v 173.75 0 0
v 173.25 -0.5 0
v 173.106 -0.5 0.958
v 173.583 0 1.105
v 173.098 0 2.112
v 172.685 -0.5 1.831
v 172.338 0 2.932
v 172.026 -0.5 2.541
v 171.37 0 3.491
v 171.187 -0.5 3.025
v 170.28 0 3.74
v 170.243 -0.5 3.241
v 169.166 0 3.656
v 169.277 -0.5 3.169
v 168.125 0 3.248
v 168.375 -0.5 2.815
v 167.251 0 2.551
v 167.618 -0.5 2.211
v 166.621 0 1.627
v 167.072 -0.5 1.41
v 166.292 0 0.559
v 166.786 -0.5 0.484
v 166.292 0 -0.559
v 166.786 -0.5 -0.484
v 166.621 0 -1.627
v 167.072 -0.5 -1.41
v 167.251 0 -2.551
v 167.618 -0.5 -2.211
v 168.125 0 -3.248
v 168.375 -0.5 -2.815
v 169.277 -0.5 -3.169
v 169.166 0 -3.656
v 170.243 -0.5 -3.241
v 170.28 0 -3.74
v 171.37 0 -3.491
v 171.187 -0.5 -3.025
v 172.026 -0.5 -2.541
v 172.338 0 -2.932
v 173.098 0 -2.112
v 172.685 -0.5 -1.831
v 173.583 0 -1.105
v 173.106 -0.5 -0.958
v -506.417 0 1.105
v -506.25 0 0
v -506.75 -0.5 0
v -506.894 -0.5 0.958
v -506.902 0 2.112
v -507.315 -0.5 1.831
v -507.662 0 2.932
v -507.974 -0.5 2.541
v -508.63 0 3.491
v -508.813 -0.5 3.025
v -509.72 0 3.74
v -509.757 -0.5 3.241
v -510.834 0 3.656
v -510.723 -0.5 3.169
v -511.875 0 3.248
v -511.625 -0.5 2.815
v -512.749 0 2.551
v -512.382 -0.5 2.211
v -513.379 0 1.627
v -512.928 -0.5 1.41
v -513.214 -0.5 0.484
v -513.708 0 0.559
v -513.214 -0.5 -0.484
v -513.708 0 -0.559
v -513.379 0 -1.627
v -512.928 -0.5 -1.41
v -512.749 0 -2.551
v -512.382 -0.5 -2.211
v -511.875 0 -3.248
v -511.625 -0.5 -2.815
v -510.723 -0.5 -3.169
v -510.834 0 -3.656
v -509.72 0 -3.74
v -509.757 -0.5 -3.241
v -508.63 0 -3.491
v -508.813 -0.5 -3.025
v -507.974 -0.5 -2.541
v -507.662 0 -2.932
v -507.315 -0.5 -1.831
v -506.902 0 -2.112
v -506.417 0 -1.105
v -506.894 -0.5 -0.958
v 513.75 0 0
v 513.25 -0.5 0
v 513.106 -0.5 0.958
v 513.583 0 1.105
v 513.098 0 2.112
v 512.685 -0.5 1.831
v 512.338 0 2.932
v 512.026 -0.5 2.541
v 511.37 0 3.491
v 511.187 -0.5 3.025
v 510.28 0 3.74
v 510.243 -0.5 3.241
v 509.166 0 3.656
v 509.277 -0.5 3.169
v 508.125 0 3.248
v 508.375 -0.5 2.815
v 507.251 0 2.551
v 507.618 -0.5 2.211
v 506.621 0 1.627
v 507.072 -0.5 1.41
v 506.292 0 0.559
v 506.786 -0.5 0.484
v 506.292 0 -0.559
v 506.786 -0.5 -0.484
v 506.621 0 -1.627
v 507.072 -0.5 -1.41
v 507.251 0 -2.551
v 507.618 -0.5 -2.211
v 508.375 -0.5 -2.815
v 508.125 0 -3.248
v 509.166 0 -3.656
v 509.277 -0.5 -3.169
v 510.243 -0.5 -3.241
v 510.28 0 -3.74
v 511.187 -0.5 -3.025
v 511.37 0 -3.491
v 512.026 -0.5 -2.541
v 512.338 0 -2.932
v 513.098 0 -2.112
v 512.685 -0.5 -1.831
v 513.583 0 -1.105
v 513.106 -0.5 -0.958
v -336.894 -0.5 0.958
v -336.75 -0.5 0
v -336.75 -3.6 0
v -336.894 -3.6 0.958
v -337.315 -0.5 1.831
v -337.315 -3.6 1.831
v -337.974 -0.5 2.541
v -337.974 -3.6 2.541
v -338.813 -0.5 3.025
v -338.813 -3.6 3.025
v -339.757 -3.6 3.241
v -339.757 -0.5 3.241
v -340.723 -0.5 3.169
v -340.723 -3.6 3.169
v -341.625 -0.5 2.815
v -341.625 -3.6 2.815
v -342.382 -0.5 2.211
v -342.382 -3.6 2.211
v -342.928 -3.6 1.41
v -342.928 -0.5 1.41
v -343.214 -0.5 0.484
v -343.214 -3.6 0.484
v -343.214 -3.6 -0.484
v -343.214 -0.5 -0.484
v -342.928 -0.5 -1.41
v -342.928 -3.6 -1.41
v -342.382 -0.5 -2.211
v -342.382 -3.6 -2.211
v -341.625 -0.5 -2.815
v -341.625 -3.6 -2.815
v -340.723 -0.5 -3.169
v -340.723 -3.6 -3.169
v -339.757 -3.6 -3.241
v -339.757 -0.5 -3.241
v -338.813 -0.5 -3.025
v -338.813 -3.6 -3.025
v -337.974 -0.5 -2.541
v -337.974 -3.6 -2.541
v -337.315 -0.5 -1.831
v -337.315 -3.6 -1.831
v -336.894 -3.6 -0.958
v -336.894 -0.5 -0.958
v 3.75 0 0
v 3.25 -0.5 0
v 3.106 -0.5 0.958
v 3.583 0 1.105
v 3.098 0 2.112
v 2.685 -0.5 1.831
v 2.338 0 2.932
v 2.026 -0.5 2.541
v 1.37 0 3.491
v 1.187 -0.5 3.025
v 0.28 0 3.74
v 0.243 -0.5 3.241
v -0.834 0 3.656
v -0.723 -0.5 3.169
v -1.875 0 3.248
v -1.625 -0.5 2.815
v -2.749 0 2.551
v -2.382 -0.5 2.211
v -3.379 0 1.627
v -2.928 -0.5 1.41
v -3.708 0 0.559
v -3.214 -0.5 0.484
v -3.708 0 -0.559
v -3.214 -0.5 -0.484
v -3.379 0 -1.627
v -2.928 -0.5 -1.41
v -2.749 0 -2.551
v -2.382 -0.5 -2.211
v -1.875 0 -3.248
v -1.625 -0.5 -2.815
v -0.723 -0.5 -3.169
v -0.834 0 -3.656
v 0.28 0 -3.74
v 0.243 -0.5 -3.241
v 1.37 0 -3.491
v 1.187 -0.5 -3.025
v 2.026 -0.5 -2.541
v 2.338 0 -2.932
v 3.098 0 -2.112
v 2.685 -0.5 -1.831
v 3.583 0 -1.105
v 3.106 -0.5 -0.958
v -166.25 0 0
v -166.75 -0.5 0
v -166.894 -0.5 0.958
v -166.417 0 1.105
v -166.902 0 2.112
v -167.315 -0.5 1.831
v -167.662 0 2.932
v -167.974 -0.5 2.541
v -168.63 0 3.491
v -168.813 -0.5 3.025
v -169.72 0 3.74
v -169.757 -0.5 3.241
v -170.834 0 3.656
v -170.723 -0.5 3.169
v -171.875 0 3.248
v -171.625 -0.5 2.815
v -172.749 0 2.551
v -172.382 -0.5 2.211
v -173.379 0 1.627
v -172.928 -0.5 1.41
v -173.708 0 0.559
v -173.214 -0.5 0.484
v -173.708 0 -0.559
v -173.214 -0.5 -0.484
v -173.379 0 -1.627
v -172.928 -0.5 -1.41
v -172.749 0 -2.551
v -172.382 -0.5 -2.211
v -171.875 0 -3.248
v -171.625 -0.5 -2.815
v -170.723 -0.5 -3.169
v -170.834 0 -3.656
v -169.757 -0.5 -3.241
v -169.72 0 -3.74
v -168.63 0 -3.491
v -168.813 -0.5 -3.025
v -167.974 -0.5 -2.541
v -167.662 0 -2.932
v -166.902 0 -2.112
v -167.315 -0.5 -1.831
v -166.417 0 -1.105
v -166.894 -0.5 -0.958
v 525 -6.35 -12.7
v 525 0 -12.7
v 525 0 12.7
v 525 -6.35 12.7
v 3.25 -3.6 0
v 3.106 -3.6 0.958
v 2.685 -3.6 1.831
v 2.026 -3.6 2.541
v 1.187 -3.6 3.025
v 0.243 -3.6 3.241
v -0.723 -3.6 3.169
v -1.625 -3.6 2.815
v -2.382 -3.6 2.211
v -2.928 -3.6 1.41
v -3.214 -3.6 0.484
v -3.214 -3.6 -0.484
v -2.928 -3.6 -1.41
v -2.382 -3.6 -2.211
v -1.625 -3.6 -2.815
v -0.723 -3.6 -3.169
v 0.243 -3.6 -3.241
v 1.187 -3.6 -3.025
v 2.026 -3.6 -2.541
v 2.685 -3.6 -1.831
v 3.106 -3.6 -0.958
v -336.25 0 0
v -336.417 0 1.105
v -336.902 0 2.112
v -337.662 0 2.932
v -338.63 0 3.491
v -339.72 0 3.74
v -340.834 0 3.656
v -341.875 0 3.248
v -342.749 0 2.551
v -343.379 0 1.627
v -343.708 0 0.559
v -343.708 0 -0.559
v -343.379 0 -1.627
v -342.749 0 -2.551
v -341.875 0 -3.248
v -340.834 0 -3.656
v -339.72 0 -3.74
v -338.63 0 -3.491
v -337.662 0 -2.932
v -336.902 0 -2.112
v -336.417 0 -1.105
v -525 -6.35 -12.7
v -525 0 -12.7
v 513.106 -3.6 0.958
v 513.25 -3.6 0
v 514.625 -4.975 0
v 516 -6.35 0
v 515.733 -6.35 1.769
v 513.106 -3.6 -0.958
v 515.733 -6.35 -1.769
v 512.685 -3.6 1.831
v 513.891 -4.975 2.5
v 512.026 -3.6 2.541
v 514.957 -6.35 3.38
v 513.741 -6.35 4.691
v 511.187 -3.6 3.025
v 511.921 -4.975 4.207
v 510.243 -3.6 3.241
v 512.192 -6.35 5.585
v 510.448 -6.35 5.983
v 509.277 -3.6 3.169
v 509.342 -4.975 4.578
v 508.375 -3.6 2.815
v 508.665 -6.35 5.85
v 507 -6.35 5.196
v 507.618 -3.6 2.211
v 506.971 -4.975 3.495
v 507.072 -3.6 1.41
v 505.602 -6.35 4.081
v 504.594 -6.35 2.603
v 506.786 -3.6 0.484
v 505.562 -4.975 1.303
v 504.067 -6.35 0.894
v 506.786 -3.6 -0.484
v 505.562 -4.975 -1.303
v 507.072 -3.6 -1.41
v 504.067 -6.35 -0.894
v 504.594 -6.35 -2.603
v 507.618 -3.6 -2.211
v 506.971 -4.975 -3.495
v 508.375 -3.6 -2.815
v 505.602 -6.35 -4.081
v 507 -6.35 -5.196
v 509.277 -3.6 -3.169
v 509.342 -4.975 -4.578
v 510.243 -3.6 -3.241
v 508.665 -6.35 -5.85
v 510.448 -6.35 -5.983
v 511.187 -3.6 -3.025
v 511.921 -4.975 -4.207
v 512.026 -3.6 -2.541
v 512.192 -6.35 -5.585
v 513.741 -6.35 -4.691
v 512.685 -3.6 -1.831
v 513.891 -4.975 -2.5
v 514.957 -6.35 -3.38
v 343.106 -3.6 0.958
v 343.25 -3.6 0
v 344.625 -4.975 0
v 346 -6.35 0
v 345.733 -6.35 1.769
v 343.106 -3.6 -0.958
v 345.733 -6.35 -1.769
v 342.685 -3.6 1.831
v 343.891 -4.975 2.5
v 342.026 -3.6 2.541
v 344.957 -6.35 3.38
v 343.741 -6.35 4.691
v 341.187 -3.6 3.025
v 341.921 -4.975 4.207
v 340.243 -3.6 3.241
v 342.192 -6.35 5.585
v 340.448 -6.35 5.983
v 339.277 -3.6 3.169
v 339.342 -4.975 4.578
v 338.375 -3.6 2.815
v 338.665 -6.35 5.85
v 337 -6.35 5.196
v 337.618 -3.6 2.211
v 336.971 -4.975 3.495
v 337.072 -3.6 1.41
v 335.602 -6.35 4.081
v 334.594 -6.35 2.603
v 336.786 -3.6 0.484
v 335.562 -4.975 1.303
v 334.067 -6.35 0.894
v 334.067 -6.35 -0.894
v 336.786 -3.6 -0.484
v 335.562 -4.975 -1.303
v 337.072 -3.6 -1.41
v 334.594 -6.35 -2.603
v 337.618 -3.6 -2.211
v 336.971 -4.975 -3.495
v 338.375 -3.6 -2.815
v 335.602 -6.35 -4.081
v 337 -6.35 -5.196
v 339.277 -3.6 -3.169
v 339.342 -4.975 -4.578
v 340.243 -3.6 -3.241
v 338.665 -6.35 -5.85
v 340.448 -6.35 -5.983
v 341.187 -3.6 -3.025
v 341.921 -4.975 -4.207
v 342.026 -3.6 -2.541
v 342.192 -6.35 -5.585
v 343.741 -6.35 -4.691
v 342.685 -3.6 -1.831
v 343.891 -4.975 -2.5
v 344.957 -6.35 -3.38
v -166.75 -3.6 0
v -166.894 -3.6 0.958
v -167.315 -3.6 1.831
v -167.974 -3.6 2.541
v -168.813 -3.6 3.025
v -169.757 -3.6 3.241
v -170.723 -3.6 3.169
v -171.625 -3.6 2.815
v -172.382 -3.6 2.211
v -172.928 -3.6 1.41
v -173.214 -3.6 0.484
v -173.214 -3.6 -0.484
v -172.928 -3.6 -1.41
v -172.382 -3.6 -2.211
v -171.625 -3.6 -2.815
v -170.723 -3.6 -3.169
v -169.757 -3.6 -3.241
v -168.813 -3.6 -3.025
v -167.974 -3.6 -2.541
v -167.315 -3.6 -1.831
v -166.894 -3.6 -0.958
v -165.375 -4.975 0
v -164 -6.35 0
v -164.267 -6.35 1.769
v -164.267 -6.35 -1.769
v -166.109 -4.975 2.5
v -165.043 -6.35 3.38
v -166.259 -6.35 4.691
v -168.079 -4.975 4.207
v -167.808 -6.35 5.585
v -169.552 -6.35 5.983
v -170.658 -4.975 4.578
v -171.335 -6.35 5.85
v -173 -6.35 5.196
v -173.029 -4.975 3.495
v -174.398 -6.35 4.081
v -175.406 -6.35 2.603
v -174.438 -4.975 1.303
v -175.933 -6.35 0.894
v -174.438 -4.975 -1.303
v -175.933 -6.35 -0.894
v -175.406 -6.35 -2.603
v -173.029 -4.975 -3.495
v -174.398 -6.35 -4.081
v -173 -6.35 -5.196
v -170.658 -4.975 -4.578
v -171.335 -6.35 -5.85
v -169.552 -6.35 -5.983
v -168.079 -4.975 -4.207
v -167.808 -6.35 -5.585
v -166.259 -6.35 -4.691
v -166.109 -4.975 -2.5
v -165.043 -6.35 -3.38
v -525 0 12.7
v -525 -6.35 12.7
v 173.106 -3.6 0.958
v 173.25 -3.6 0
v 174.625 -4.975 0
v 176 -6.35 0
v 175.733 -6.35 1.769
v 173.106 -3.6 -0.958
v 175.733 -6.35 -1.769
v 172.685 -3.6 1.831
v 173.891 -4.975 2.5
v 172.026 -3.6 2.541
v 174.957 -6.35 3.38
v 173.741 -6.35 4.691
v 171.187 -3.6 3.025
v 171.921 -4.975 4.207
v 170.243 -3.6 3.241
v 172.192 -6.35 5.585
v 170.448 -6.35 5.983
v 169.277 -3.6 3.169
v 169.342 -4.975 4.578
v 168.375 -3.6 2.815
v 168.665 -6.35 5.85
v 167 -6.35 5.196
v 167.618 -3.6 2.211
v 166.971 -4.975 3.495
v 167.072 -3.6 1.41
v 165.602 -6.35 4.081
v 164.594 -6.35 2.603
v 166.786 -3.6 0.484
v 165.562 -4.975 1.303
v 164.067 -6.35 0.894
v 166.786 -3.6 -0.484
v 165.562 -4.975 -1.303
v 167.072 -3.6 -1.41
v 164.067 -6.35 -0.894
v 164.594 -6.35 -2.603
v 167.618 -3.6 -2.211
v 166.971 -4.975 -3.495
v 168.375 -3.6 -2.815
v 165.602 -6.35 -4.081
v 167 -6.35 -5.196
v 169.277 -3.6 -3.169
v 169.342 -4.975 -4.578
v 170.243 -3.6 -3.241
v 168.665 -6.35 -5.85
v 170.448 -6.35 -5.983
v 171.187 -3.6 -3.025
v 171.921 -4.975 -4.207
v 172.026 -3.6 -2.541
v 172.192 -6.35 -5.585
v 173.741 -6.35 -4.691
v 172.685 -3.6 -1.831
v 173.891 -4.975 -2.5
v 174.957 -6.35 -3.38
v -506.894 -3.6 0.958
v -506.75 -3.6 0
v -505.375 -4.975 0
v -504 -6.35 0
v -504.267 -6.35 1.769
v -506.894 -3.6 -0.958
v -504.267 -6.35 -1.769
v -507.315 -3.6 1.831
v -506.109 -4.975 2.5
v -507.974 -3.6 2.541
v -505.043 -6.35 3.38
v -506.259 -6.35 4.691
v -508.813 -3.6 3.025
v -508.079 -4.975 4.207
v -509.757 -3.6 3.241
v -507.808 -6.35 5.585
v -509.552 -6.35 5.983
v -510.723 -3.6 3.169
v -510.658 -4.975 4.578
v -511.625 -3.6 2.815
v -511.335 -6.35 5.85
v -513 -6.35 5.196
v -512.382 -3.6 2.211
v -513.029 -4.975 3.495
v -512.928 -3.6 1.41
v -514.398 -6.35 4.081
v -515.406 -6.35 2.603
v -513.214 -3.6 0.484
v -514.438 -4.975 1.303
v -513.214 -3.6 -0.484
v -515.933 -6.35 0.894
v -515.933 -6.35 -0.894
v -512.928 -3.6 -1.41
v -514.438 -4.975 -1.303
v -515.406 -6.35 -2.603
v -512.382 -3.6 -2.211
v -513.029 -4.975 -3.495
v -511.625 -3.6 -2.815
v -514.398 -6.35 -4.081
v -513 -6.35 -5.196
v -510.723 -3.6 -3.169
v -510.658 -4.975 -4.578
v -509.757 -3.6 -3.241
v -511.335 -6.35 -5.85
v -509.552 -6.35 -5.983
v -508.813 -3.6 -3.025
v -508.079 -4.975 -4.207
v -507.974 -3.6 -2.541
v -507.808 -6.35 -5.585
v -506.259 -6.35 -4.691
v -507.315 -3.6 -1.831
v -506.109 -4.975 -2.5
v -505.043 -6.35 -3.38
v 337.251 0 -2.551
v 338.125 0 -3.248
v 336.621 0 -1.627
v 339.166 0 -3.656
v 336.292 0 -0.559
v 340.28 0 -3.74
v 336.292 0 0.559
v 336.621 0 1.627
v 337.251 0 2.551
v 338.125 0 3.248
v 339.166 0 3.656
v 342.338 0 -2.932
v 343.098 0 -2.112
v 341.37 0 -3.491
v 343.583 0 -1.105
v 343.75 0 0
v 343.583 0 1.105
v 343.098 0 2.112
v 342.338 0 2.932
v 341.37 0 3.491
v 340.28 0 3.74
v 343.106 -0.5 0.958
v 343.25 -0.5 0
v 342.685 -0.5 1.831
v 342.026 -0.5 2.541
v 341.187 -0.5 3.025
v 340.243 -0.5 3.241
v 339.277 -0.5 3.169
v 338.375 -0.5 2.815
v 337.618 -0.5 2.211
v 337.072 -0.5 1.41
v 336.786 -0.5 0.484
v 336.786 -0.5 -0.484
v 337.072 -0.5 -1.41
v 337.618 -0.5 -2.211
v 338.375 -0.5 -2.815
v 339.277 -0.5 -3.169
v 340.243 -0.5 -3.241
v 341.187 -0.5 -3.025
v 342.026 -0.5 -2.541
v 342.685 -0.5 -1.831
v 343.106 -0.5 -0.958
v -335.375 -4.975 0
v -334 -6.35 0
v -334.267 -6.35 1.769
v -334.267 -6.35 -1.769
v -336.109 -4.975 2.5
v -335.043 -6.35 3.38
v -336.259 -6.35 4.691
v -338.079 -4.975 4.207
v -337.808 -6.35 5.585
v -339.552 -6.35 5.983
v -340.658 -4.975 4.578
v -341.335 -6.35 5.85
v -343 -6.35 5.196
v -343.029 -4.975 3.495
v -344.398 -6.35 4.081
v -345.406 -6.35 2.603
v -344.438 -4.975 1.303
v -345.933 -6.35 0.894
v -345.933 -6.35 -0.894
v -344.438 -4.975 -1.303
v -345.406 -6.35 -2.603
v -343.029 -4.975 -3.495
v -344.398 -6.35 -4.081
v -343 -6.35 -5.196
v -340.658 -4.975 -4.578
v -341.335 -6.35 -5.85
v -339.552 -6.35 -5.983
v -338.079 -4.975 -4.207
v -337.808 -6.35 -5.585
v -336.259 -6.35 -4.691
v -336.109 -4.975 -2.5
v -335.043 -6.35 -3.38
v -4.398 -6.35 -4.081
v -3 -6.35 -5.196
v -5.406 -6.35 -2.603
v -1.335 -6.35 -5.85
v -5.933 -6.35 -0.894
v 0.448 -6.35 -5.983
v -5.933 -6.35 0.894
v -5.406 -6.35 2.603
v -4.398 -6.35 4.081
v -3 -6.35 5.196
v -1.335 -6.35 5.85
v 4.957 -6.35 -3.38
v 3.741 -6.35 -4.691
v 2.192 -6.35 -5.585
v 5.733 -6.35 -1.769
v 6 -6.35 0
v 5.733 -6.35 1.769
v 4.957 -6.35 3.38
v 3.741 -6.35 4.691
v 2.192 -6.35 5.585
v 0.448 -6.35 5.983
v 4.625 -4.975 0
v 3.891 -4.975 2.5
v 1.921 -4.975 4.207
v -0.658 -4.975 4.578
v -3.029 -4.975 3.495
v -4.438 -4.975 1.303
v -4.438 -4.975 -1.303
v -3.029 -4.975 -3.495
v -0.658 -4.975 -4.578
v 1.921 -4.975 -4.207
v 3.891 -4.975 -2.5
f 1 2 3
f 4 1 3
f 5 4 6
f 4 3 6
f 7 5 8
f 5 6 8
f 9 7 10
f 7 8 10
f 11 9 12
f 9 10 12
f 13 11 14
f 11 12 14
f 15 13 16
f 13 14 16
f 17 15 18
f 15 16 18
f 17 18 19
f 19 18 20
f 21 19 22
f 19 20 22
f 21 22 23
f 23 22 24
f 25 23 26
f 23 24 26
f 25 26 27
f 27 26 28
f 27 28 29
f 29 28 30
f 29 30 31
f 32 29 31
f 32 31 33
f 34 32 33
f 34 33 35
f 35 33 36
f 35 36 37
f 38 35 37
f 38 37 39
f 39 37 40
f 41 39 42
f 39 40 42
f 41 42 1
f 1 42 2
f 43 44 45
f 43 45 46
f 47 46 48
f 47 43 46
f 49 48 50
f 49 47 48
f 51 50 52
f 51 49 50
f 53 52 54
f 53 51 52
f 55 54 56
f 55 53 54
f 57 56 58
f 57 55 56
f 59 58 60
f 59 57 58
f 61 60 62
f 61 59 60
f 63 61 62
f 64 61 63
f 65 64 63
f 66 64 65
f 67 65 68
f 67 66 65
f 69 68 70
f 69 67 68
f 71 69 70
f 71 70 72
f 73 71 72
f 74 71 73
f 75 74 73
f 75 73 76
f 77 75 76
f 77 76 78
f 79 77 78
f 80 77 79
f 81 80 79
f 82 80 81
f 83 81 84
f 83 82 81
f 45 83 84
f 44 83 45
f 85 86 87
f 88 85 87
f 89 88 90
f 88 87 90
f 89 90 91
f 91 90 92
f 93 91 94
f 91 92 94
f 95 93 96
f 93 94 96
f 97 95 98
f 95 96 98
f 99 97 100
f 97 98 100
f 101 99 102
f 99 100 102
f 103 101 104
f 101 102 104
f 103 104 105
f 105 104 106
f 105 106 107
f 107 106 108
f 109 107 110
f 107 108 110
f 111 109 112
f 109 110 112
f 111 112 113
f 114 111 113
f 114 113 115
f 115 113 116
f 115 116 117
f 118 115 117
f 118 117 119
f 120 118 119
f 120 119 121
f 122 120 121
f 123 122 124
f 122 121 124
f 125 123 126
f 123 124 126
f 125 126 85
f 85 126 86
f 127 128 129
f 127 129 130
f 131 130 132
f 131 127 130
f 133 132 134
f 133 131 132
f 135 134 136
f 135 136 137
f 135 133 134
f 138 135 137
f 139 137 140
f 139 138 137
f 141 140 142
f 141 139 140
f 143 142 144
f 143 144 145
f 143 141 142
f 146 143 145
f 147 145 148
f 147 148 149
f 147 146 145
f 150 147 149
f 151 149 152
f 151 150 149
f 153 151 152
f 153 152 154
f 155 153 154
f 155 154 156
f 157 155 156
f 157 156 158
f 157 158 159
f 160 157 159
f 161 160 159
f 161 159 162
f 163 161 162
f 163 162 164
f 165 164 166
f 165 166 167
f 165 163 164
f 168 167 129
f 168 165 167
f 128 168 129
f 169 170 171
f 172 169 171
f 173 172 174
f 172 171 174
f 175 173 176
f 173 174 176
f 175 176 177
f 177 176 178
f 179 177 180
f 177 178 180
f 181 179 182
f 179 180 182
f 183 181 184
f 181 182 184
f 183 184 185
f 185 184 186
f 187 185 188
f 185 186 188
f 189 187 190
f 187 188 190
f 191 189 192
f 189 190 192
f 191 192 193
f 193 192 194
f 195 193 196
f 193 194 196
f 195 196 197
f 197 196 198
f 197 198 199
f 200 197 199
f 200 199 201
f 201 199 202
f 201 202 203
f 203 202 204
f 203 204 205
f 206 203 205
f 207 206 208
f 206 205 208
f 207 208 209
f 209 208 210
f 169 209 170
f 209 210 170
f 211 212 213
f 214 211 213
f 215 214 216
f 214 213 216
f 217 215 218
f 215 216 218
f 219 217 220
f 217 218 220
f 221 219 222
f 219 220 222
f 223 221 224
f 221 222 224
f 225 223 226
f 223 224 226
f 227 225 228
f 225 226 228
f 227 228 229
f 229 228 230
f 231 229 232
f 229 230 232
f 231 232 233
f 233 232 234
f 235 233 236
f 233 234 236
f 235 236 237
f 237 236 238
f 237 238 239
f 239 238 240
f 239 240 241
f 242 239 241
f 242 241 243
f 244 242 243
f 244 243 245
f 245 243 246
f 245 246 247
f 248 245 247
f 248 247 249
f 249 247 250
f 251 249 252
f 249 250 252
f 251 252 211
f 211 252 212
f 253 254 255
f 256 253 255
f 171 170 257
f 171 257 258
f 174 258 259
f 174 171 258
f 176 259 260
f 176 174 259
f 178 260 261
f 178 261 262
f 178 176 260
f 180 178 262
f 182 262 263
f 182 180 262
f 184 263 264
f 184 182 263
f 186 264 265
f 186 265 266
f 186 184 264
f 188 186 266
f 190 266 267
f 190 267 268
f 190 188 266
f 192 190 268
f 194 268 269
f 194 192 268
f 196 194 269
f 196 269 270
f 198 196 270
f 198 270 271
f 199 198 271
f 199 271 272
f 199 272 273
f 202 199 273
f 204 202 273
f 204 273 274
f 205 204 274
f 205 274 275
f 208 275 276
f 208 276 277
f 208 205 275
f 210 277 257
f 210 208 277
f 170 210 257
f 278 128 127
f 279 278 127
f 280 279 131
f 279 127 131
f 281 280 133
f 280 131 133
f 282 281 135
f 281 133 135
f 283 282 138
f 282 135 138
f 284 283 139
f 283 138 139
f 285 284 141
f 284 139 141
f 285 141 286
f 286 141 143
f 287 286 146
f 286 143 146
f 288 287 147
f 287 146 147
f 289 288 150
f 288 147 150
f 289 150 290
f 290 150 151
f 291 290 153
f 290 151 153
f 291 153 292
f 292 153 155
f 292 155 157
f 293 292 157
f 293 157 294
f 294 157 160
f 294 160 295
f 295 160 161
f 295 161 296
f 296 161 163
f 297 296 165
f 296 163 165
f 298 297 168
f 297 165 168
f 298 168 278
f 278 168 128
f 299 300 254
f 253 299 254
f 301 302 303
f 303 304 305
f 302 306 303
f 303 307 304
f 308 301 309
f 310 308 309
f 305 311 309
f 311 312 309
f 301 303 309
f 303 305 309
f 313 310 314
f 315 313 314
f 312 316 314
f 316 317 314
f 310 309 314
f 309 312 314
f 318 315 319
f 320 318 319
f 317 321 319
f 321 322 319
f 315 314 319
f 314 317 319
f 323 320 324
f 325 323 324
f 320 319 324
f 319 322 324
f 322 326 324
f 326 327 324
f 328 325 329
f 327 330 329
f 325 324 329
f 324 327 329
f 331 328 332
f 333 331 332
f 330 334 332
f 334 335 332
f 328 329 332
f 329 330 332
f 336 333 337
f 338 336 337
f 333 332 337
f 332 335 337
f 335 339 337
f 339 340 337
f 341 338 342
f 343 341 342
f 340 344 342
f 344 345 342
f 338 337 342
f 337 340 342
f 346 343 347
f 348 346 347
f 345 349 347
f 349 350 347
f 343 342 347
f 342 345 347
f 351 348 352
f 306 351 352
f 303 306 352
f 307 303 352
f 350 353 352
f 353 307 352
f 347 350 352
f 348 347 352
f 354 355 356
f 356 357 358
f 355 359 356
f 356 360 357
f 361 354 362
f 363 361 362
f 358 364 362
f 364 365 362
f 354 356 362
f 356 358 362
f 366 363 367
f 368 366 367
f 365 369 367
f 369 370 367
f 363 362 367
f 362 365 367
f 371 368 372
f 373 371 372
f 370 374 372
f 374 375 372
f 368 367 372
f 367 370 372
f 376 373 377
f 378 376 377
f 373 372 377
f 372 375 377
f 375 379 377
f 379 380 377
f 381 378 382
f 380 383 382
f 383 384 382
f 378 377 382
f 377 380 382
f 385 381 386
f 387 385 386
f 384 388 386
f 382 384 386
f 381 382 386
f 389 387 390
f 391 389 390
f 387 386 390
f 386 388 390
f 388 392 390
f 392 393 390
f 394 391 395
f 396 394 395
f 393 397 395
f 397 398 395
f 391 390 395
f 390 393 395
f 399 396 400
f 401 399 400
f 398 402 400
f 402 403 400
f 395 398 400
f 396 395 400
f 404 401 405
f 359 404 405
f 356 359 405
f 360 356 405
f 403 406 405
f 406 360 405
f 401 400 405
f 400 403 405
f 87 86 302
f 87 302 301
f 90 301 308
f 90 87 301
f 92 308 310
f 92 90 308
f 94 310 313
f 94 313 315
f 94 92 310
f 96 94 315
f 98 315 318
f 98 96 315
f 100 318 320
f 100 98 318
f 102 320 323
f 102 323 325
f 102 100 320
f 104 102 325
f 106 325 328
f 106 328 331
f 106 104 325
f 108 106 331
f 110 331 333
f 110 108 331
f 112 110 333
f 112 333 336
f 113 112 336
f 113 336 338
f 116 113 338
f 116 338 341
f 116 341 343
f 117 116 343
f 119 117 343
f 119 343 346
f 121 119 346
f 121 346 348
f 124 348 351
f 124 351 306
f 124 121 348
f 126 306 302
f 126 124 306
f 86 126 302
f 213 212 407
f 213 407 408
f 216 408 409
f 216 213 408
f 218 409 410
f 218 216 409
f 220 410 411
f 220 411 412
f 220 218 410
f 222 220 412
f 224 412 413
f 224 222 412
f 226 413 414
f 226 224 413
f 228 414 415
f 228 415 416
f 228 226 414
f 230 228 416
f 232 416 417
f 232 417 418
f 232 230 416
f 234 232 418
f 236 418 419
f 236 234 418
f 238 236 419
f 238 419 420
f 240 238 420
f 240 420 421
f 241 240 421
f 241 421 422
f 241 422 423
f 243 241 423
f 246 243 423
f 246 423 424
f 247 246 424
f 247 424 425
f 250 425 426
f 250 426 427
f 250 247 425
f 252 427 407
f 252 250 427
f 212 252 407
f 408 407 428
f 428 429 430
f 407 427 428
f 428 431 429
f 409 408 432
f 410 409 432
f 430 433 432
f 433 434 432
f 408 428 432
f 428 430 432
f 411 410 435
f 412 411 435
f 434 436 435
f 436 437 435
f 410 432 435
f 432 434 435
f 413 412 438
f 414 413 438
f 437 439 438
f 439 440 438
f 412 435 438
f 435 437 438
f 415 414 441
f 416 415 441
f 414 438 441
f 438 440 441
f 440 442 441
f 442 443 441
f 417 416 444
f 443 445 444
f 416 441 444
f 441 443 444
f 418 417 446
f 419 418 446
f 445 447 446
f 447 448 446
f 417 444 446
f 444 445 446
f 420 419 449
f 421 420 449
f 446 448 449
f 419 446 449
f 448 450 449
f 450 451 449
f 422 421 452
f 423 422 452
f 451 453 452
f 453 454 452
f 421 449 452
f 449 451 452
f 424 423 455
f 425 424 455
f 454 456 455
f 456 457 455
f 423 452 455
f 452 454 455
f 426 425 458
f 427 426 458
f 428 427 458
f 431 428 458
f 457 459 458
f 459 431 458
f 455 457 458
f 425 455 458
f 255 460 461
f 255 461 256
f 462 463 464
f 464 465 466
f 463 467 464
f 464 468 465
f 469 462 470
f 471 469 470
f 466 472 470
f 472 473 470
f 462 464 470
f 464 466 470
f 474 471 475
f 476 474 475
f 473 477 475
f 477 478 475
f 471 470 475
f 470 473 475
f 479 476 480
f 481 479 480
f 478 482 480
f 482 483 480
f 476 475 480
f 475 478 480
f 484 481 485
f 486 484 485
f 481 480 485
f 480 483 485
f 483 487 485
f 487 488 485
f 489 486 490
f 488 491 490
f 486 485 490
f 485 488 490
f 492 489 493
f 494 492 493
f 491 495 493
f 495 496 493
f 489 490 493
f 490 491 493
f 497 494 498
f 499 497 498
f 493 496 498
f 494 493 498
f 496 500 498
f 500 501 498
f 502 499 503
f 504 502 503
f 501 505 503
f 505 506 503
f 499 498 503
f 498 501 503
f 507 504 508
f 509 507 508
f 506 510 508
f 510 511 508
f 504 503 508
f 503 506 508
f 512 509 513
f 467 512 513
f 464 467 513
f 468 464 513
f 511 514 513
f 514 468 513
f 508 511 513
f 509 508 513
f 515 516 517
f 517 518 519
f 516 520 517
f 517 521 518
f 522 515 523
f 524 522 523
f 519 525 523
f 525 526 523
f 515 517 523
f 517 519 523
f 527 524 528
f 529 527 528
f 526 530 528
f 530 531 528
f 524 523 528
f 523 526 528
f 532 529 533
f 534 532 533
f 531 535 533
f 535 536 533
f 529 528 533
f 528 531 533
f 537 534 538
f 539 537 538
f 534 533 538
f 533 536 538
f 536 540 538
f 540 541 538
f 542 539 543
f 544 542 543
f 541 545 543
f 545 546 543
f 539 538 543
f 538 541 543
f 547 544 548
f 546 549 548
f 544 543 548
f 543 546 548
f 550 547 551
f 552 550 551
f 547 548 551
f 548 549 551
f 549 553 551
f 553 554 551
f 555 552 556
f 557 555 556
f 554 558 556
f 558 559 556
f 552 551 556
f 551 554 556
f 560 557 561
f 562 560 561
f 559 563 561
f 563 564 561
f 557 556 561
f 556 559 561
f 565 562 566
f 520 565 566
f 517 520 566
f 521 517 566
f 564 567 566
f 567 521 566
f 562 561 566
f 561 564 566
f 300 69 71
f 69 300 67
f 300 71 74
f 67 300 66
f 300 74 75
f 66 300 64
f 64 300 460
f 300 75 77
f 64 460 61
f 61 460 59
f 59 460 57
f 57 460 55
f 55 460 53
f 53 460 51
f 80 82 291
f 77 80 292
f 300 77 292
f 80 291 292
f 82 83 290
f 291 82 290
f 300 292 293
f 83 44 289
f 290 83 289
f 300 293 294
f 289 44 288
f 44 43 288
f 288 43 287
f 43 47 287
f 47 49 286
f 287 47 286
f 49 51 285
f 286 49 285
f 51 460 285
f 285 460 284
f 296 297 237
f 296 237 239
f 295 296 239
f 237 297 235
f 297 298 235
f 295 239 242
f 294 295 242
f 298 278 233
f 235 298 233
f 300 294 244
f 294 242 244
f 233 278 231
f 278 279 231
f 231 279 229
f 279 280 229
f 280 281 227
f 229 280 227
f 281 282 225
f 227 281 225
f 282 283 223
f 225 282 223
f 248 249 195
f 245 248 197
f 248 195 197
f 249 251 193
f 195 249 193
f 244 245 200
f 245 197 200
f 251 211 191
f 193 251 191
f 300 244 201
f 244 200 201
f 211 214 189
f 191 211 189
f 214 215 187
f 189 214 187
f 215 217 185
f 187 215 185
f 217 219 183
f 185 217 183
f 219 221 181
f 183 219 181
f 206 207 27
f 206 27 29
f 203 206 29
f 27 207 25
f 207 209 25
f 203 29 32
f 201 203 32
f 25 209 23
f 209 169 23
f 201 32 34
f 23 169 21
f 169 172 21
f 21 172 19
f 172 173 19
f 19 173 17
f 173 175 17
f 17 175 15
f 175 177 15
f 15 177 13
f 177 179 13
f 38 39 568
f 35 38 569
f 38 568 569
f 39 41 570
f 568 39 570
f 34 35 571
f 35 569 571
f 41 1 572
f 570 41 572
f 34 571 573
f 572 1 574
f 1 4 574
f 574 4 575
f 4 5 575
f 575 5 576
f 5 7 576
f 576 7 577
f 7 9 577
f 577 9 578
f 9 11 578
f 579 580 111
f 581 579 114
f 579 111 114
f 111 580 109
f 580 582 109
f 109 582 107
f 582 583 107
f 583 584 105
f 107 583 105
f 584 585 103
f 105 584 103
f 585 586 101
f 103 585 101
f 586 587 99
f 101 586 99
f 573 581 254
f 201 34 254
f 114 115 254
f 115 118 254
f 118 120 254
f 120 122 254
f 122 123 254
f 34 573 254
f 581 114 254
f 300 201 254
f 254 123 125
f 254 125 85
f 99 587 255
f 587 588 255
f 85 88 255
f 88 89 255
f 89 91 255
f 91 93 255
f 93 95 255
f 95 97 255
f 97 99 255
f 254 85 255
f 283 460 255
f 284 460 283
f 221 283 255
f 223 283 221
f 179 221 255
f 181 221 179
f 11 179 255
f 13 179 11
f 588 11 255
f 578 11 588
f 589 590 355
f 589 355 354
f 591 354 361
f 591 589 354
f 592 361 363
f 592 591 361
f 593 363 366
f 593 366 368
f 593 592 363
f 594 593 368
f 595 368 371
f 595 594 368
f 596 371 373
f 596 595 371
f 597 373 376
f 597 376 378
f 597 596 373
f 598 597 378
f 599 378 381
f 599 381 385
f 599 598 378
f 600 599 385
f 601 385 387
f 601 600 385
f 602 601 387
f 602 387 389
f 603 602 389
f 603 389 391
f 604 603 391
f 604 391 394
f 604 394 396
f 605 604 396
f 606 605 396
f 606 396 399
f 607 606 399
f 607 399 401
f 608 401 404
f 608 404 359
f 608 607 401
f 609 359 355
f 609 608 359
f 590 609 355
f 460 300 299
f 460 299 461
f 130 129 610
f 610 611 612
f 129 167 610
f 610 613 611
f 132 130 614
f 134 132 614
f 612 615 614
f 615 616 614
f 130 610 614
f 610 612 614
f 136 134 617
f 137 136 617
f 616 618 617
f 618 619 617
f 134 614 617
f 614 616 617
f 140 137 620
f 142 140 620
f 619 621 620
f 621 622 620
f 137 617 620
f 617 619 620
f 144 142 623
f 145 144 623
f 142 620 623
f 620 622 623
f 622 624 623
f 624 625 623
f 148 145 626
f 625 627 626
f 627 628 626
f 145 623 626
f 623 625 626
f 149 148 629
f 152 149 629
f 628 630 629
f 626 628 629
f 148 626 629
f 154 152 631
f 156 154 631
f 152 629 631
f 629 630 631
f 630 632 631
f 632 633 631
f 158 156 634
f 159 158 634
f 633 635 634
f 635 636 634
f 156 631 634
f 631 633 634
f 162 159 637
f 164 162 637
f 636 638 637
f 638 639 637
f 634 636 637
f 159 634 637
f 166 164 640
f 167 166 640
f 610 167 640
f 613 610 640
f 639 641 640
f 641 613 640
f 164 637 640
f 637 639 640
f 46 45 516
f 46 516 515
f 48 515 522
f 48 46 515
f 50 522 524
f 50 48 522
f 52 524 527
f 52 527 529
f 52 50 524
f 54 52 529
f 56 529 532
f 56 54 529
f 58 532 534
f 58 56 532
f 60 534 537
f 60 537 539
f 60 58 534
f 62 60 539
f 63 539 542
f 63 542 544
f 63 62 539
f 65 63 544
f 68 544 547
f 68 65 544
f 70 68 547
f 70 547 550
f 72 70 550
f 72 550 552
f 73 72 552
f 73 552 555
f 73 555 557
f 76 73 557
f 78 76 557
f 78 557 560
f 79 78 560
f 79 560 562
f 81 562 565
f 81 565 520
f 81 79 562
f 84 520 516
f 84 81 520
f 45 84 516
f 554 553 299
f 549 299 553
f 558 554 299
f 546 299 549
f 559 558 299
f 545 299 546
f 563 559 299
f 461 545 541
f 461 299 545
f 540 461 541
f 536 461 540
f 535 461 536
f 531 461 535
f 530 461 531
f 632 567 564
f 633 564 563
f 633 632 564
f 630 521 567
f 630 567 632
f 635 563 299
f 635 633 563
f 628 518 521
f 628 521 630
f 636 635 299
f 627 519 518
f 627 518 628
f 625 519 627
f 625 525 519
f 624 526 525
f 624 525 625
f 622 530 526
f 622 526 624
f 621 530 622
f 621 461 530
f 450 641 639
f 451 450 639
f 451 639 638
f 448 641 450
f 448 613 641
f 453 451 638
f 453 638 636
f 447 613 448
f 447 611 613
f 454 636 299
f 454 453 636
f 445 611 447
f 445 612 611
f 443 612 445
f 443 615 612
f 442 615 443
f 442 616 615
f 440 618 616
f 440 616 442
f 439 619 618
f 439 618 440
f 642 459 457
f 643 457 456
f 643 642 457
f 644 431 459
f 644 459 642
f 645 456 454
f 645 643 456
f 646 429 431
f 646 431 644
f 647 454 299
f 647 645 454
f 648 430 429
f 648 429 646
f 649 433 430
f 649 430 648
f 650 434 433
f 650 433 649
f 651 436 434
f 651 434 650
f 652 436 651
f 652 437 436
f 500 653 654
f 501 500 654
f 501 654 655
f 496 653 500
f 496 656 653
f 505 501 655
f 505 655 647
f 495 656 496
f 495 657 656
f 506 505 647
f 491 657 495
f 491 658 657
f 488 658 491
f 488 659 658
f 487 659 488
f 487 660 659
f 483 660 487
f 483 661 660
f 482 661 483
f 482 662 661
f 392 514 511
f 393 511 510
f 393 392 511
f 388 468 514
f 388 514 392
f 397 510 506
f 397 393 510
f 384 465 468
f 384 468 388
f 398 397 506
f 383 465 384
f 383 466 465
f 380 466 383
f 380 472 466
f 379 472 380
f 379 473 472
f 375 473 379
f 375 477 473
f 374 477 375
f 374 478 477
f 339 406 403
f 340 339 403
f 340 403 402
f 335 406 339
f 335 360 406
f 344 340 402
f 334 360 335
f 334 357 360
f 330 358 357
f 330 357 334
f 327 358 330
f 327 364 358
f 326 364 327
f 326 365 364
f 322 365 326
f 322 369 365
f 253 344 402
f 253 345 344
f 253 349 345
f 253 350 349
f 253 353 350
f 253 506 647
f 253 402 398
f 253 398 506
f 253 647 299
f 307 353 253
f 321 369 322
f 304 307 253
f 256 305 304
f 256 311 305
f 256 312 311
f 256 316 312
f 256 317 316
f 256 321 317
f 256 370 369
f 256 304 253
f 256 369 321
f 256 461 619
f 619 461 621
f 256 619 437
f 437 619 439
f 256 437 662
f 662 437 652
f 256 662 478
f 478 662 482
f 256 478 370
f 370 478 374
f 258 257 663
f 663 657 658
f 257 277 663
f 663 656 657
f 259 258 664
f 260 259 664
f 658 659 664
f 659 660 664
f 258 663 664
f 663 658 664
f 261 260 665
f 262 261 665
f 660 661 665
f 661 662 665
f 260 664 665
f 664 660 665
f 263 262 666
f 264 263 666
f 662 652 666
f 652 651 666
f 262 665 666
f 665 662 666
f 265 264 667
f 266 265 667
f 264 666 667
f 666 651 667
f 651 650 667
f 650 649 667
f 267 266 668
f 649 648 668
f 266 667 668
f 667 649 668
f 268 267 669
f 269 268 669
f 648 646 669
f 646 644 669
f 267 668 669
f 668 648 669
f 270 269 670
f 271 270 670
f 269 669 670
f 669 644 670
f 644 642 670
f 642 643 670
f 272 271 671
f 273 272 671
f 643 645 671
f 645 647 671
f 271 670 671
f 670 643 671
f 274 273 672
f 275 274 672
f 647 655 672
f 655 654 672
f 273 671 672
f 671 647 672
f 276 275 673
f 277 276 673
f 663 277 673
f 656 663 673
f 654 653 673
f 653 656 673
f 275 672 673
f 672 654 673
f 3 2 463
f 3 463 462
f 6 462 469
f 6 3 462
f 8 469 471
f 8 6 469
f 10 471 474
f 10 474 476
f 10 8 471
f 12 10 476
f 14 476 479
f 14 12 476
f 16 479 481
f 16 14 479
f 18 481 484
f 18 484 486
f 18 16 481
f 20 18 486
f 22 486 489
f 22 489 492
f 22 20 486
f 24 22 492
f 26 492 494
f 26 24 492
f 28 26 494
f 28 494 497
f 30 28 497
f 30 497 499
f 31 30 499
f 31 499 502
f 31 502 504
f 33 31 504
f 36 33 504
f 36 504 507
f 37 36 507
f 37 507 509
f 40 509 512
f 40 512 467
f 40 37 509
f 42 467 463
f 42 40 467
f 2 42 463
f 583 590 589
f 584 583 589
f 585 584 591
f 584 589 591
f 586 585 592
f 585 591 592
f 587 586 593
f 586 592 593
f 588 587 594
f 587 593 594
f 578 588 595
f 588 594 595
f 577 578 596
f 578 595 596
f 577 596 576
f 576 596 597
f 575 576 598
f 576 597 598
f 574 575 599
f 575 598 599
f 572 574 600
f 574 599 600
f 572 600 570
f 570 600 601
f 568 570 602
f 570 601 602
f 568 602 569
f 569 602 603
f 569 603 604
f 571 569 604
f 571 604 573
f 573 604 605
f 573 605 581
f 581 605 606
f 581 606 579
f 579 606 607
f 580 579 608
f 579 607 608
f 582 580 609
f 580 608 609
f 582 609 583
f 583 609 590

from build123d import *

# Parameters (mm, degrees)
F0_W     = 1050
F0_H     = 25.4
F0_R     = 3.25
F1_DEPTH = 6.35
F2_SIZE  = 2.75
F3_SIZE  = 0.5


with BuildPart() as f1:
    # F0 (on Front) → F1 (new body)
    with BuildSketch(Plane.XZ):
        Rectangle(F0_W, F0_H)
        with Locations((-510, 0)):
            Circle(F0_R, mode=Mode.SUBTRACT)
        with Locations((-340, 0)):
            Circle(F0_R, mode=Mode.SUBTRACT)
        with Locations((-170, 0)):
            Circle(F0_R, mode=Mode.SUBTRACT)
        Circle(F0_R, mode=Mode.SUBTRACT)
        with Locations((170, 0)):
            Circle(F0_R, mode=Mode.SUBTRACT)
        with Locations((340, 0)):
            Circle(F0_R, mode=Mode.SUBTRACT)
        with Locations((510, 0)):
            Circle(F0_R, mode=Mode.SUBTRACT)
    extrude(amount=F1_DEPTH)

    # F2
    f2_edges = [f1.edges().sort_by_distance(p)[0] for p in [
        (-513.25, -6.35, 0),
        (-173.25, -6.35, 0),
        (-343.25, -6.35, 0),
        (-3.25, -6.35, 0),
        (166.75, -6.35, 0),
        (506.75, -6.35, 0),
        (336.75, -6.35, 0),
    ]]
    chamfer(f2_edges, length=F2_SIZE)

    # F3
    f3_edges = [f1.edges().sort_by_distance(p)[0] for p in [
        (-513.25, 0, 0),
        (-343.25, 0, 0),
        (-173.25, 0, 0),
        (-3.25, 0, 0),
        (166.75, 0, 0),
        (336.75, 0, 0),
        (506.75, 0, 0),
    ]]
    chamfer(f3_edges, length=F3_SIZE)


solid = f1.part
